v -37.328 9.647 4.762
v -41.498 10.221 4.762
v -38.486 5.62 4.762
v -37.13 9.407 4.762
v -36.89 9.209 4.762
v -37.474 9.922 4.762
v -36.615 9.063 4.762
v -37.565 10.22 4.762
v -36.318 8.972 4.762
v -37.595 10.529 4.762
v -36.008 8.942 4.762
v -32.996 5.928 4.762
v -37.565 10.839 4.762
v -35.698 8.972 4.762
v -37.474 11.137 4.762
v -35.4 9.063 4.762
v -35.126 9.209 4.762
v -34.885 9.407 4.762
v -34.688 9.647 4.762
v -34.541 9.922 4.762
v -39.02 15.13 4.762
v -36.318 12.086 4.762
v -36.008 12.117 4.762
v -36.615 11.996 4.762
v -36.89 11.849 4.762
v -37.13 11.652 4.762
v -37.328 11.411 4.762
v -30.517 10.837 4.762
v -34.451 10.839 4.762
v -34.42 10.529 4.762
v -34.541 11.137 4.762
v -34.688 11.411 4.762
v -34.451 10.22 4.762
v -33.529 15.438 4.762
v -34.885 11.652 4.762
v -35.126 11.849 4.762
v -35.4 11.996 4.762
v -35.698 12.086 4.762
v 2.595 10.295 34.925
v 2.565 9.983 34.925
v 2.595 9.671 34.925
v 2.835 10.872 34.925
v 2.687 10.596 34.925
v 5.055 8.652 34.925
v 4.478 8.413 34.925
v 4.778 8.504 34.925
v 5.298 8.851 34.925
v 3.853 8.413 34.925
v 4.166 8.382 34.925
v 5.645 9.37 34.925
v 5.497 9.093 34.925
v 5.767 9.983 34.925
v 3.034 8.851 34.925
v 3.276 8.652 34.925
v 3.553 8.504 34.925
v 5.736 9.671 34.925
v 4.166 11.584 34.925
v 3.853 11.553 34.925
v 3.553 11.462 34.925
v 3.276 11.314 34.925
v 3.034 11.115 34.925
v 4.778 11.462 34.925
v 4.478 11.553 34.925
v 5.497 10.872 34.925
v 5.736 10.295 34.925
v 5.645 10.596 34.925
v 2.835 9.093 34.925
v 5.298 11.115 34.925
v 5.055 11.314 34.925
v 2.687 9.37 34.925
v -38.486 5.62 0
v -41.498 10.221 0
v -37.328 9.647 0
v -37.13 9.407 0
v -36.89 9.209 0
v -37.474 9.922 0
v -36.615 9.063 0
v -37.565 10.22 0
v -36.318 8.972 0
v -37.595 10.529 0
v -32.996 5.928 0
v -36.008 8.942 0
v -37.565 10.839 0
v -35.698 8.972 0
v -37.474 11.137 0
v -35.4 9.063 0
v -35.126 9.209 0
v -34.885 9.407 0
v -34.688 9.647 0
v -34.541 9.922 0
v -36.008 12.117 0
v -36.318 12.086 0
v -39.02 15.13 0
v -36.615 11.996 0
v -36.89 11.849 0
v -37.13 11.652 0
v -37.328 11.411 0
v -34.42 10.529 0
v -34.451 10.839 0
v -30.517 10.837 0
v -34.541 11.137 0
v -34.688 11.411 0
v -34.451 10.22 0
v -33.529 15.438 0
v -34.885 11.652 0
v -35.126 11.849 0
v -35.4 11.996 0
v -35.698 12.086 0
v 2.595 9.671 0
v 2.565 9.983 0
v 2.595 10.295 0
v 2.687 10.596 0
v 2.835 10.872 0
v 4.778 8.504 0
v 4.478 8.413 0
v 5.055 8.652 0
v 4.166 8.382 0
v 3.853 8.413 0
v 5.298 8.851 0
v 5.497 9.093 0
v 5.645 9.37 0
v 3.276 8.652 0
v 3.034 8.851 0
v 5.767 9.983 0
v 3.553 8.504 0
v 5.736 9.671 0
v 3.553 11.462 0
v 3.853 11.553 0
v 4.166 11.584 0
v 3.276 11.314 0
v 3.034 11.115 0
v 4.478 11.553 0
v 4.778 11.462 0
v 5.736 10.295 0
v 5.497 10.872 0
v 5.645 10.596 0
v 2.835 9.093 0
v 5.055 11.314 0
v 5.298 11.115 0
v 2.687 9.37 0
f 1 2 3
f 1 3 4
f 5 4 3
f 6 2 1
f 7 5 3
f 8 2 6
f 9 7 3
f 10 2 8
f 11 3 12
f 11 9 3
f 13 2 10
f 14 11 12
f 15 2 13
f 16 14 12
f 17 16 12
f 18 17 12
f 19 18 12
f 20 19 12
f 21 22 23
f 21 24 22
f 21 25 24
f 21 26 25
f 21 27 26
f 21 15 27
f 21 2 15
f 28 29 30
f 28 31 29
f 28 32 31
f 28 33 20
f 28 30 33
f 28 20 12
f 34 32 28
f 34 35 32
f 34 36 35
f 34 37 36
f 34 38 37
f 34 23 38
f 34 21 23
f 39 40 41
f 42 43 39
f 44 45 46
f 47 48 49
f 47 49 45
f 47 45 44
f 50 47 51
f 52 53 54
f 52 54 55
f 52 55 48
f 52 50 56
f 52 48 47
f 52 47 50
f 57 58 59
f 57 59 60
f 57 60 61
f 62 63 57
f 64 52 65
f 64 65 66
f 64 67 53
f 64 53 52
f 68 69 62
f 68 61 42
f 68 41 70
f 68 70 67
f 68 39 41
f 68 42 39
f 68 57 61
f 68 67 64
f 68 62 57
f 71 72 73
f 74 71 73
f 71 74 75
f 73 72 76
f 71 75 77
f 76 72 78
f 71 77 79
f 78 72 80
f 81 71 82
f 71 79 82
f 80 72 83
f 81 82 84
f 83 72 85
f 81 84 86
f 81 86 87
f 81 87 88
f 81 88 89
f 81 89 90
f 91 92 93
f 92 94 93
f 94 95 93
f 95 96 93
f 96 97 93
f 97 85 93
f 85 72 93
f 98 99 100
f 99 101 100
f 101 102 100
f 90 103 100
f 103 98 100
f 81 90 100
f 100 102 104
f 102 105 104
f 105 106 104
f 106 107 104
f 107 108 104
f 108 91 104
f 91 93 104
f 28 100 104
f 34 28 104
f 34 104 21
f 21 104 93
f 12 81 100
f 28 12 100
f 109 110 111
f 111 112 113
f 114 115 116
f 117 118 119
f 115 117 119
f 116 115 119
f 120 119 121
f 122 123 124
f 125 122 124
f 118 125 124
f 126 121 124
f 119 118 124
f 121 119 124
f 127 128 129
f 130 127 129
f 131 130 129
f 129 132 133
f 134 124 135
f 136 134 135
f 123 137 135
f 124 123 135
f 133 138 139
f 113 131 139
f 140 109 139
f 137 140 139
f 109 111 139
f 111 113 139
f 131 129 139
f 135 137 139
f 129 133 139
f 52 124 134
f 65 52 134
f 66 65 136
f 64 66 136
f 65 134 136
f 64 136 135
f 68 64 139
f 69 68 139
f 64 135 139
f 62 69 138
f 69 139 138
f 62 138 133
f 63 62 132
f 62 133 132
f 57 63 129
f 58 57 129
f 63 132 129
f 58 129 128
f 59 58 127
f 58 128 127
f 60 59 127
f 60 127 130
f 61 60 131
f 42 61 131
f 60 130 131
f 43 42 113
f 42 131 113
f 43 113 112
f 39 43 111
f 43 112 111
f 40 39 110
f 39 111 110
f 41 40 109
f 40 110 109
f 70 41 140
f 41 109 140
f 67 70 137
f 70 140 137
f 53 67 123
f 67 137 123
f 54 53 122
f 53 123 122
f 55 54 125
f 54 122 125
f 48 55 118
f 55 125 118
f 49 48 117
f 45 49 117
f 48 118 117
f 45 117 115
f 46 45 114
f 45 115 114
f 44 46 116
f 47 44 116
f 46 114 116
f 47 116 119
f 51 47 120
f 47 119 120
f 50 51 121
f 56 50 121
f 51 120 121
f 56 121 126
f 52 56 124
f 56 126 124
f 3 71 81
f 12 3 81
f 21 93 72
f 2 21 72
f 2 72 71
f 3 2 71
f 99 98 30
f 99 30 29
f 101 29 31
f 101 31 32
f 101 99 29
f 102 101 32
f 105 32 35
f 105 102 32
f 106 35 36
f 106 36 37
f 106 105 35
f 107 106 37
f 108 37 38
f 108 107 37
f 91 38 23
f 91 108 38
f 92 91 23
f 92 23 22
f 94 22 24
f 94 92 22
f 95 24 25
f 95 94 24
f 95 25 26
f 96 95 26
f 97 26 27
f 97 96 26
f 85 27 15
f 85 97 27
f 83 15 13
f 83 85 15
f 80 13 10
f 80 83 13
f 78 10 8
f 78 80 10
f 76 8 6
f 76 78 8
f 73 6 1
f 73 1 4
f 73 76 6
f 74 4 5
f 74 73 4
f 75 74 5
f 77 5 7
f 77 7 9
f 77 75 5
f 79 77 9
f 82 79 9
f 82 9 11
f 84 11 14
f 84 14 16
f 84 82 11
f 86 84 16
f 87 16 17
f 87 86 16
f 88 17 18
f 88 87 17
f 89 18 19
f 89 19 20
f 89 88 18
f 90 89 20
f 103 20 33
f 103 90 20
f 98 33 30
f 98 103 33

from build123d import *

# Parameters (mm, degrees)
F0_R     = 1.5875
F1_DEPTH = 4.7625
F2_R     = 1.601024
F3_DEPTH = 34.925


with BuildPart() as f1:
    # F0 (on Top) → F1 (new body)
    with BuildSketch(Plane.XY):
        Polygon((-32.995806, 5.928171), (-30.517198, 10.83718), (-33.529221, 15.438223), (-39.019852, 15.130256), (-41.49846, 10.221247), (-38.486437, 5.620204), align=None)
        with Locations((-36.007829, 10.529214)):
            Circle(F0_R, mode=Mode.SUBTRACT)
    extrude(amount=F1_DEPTH)


with BuildPart() as f3:
    # F2 (on Top) → F3 (new body)
    with BuildSketch(Plane.XY):
        with Locations((4.165734, 9.982973)):
            Circle(F2_R)
    extrude(amount=F3_DEPTH)


solid = Compound([f1.part, f3.part])
